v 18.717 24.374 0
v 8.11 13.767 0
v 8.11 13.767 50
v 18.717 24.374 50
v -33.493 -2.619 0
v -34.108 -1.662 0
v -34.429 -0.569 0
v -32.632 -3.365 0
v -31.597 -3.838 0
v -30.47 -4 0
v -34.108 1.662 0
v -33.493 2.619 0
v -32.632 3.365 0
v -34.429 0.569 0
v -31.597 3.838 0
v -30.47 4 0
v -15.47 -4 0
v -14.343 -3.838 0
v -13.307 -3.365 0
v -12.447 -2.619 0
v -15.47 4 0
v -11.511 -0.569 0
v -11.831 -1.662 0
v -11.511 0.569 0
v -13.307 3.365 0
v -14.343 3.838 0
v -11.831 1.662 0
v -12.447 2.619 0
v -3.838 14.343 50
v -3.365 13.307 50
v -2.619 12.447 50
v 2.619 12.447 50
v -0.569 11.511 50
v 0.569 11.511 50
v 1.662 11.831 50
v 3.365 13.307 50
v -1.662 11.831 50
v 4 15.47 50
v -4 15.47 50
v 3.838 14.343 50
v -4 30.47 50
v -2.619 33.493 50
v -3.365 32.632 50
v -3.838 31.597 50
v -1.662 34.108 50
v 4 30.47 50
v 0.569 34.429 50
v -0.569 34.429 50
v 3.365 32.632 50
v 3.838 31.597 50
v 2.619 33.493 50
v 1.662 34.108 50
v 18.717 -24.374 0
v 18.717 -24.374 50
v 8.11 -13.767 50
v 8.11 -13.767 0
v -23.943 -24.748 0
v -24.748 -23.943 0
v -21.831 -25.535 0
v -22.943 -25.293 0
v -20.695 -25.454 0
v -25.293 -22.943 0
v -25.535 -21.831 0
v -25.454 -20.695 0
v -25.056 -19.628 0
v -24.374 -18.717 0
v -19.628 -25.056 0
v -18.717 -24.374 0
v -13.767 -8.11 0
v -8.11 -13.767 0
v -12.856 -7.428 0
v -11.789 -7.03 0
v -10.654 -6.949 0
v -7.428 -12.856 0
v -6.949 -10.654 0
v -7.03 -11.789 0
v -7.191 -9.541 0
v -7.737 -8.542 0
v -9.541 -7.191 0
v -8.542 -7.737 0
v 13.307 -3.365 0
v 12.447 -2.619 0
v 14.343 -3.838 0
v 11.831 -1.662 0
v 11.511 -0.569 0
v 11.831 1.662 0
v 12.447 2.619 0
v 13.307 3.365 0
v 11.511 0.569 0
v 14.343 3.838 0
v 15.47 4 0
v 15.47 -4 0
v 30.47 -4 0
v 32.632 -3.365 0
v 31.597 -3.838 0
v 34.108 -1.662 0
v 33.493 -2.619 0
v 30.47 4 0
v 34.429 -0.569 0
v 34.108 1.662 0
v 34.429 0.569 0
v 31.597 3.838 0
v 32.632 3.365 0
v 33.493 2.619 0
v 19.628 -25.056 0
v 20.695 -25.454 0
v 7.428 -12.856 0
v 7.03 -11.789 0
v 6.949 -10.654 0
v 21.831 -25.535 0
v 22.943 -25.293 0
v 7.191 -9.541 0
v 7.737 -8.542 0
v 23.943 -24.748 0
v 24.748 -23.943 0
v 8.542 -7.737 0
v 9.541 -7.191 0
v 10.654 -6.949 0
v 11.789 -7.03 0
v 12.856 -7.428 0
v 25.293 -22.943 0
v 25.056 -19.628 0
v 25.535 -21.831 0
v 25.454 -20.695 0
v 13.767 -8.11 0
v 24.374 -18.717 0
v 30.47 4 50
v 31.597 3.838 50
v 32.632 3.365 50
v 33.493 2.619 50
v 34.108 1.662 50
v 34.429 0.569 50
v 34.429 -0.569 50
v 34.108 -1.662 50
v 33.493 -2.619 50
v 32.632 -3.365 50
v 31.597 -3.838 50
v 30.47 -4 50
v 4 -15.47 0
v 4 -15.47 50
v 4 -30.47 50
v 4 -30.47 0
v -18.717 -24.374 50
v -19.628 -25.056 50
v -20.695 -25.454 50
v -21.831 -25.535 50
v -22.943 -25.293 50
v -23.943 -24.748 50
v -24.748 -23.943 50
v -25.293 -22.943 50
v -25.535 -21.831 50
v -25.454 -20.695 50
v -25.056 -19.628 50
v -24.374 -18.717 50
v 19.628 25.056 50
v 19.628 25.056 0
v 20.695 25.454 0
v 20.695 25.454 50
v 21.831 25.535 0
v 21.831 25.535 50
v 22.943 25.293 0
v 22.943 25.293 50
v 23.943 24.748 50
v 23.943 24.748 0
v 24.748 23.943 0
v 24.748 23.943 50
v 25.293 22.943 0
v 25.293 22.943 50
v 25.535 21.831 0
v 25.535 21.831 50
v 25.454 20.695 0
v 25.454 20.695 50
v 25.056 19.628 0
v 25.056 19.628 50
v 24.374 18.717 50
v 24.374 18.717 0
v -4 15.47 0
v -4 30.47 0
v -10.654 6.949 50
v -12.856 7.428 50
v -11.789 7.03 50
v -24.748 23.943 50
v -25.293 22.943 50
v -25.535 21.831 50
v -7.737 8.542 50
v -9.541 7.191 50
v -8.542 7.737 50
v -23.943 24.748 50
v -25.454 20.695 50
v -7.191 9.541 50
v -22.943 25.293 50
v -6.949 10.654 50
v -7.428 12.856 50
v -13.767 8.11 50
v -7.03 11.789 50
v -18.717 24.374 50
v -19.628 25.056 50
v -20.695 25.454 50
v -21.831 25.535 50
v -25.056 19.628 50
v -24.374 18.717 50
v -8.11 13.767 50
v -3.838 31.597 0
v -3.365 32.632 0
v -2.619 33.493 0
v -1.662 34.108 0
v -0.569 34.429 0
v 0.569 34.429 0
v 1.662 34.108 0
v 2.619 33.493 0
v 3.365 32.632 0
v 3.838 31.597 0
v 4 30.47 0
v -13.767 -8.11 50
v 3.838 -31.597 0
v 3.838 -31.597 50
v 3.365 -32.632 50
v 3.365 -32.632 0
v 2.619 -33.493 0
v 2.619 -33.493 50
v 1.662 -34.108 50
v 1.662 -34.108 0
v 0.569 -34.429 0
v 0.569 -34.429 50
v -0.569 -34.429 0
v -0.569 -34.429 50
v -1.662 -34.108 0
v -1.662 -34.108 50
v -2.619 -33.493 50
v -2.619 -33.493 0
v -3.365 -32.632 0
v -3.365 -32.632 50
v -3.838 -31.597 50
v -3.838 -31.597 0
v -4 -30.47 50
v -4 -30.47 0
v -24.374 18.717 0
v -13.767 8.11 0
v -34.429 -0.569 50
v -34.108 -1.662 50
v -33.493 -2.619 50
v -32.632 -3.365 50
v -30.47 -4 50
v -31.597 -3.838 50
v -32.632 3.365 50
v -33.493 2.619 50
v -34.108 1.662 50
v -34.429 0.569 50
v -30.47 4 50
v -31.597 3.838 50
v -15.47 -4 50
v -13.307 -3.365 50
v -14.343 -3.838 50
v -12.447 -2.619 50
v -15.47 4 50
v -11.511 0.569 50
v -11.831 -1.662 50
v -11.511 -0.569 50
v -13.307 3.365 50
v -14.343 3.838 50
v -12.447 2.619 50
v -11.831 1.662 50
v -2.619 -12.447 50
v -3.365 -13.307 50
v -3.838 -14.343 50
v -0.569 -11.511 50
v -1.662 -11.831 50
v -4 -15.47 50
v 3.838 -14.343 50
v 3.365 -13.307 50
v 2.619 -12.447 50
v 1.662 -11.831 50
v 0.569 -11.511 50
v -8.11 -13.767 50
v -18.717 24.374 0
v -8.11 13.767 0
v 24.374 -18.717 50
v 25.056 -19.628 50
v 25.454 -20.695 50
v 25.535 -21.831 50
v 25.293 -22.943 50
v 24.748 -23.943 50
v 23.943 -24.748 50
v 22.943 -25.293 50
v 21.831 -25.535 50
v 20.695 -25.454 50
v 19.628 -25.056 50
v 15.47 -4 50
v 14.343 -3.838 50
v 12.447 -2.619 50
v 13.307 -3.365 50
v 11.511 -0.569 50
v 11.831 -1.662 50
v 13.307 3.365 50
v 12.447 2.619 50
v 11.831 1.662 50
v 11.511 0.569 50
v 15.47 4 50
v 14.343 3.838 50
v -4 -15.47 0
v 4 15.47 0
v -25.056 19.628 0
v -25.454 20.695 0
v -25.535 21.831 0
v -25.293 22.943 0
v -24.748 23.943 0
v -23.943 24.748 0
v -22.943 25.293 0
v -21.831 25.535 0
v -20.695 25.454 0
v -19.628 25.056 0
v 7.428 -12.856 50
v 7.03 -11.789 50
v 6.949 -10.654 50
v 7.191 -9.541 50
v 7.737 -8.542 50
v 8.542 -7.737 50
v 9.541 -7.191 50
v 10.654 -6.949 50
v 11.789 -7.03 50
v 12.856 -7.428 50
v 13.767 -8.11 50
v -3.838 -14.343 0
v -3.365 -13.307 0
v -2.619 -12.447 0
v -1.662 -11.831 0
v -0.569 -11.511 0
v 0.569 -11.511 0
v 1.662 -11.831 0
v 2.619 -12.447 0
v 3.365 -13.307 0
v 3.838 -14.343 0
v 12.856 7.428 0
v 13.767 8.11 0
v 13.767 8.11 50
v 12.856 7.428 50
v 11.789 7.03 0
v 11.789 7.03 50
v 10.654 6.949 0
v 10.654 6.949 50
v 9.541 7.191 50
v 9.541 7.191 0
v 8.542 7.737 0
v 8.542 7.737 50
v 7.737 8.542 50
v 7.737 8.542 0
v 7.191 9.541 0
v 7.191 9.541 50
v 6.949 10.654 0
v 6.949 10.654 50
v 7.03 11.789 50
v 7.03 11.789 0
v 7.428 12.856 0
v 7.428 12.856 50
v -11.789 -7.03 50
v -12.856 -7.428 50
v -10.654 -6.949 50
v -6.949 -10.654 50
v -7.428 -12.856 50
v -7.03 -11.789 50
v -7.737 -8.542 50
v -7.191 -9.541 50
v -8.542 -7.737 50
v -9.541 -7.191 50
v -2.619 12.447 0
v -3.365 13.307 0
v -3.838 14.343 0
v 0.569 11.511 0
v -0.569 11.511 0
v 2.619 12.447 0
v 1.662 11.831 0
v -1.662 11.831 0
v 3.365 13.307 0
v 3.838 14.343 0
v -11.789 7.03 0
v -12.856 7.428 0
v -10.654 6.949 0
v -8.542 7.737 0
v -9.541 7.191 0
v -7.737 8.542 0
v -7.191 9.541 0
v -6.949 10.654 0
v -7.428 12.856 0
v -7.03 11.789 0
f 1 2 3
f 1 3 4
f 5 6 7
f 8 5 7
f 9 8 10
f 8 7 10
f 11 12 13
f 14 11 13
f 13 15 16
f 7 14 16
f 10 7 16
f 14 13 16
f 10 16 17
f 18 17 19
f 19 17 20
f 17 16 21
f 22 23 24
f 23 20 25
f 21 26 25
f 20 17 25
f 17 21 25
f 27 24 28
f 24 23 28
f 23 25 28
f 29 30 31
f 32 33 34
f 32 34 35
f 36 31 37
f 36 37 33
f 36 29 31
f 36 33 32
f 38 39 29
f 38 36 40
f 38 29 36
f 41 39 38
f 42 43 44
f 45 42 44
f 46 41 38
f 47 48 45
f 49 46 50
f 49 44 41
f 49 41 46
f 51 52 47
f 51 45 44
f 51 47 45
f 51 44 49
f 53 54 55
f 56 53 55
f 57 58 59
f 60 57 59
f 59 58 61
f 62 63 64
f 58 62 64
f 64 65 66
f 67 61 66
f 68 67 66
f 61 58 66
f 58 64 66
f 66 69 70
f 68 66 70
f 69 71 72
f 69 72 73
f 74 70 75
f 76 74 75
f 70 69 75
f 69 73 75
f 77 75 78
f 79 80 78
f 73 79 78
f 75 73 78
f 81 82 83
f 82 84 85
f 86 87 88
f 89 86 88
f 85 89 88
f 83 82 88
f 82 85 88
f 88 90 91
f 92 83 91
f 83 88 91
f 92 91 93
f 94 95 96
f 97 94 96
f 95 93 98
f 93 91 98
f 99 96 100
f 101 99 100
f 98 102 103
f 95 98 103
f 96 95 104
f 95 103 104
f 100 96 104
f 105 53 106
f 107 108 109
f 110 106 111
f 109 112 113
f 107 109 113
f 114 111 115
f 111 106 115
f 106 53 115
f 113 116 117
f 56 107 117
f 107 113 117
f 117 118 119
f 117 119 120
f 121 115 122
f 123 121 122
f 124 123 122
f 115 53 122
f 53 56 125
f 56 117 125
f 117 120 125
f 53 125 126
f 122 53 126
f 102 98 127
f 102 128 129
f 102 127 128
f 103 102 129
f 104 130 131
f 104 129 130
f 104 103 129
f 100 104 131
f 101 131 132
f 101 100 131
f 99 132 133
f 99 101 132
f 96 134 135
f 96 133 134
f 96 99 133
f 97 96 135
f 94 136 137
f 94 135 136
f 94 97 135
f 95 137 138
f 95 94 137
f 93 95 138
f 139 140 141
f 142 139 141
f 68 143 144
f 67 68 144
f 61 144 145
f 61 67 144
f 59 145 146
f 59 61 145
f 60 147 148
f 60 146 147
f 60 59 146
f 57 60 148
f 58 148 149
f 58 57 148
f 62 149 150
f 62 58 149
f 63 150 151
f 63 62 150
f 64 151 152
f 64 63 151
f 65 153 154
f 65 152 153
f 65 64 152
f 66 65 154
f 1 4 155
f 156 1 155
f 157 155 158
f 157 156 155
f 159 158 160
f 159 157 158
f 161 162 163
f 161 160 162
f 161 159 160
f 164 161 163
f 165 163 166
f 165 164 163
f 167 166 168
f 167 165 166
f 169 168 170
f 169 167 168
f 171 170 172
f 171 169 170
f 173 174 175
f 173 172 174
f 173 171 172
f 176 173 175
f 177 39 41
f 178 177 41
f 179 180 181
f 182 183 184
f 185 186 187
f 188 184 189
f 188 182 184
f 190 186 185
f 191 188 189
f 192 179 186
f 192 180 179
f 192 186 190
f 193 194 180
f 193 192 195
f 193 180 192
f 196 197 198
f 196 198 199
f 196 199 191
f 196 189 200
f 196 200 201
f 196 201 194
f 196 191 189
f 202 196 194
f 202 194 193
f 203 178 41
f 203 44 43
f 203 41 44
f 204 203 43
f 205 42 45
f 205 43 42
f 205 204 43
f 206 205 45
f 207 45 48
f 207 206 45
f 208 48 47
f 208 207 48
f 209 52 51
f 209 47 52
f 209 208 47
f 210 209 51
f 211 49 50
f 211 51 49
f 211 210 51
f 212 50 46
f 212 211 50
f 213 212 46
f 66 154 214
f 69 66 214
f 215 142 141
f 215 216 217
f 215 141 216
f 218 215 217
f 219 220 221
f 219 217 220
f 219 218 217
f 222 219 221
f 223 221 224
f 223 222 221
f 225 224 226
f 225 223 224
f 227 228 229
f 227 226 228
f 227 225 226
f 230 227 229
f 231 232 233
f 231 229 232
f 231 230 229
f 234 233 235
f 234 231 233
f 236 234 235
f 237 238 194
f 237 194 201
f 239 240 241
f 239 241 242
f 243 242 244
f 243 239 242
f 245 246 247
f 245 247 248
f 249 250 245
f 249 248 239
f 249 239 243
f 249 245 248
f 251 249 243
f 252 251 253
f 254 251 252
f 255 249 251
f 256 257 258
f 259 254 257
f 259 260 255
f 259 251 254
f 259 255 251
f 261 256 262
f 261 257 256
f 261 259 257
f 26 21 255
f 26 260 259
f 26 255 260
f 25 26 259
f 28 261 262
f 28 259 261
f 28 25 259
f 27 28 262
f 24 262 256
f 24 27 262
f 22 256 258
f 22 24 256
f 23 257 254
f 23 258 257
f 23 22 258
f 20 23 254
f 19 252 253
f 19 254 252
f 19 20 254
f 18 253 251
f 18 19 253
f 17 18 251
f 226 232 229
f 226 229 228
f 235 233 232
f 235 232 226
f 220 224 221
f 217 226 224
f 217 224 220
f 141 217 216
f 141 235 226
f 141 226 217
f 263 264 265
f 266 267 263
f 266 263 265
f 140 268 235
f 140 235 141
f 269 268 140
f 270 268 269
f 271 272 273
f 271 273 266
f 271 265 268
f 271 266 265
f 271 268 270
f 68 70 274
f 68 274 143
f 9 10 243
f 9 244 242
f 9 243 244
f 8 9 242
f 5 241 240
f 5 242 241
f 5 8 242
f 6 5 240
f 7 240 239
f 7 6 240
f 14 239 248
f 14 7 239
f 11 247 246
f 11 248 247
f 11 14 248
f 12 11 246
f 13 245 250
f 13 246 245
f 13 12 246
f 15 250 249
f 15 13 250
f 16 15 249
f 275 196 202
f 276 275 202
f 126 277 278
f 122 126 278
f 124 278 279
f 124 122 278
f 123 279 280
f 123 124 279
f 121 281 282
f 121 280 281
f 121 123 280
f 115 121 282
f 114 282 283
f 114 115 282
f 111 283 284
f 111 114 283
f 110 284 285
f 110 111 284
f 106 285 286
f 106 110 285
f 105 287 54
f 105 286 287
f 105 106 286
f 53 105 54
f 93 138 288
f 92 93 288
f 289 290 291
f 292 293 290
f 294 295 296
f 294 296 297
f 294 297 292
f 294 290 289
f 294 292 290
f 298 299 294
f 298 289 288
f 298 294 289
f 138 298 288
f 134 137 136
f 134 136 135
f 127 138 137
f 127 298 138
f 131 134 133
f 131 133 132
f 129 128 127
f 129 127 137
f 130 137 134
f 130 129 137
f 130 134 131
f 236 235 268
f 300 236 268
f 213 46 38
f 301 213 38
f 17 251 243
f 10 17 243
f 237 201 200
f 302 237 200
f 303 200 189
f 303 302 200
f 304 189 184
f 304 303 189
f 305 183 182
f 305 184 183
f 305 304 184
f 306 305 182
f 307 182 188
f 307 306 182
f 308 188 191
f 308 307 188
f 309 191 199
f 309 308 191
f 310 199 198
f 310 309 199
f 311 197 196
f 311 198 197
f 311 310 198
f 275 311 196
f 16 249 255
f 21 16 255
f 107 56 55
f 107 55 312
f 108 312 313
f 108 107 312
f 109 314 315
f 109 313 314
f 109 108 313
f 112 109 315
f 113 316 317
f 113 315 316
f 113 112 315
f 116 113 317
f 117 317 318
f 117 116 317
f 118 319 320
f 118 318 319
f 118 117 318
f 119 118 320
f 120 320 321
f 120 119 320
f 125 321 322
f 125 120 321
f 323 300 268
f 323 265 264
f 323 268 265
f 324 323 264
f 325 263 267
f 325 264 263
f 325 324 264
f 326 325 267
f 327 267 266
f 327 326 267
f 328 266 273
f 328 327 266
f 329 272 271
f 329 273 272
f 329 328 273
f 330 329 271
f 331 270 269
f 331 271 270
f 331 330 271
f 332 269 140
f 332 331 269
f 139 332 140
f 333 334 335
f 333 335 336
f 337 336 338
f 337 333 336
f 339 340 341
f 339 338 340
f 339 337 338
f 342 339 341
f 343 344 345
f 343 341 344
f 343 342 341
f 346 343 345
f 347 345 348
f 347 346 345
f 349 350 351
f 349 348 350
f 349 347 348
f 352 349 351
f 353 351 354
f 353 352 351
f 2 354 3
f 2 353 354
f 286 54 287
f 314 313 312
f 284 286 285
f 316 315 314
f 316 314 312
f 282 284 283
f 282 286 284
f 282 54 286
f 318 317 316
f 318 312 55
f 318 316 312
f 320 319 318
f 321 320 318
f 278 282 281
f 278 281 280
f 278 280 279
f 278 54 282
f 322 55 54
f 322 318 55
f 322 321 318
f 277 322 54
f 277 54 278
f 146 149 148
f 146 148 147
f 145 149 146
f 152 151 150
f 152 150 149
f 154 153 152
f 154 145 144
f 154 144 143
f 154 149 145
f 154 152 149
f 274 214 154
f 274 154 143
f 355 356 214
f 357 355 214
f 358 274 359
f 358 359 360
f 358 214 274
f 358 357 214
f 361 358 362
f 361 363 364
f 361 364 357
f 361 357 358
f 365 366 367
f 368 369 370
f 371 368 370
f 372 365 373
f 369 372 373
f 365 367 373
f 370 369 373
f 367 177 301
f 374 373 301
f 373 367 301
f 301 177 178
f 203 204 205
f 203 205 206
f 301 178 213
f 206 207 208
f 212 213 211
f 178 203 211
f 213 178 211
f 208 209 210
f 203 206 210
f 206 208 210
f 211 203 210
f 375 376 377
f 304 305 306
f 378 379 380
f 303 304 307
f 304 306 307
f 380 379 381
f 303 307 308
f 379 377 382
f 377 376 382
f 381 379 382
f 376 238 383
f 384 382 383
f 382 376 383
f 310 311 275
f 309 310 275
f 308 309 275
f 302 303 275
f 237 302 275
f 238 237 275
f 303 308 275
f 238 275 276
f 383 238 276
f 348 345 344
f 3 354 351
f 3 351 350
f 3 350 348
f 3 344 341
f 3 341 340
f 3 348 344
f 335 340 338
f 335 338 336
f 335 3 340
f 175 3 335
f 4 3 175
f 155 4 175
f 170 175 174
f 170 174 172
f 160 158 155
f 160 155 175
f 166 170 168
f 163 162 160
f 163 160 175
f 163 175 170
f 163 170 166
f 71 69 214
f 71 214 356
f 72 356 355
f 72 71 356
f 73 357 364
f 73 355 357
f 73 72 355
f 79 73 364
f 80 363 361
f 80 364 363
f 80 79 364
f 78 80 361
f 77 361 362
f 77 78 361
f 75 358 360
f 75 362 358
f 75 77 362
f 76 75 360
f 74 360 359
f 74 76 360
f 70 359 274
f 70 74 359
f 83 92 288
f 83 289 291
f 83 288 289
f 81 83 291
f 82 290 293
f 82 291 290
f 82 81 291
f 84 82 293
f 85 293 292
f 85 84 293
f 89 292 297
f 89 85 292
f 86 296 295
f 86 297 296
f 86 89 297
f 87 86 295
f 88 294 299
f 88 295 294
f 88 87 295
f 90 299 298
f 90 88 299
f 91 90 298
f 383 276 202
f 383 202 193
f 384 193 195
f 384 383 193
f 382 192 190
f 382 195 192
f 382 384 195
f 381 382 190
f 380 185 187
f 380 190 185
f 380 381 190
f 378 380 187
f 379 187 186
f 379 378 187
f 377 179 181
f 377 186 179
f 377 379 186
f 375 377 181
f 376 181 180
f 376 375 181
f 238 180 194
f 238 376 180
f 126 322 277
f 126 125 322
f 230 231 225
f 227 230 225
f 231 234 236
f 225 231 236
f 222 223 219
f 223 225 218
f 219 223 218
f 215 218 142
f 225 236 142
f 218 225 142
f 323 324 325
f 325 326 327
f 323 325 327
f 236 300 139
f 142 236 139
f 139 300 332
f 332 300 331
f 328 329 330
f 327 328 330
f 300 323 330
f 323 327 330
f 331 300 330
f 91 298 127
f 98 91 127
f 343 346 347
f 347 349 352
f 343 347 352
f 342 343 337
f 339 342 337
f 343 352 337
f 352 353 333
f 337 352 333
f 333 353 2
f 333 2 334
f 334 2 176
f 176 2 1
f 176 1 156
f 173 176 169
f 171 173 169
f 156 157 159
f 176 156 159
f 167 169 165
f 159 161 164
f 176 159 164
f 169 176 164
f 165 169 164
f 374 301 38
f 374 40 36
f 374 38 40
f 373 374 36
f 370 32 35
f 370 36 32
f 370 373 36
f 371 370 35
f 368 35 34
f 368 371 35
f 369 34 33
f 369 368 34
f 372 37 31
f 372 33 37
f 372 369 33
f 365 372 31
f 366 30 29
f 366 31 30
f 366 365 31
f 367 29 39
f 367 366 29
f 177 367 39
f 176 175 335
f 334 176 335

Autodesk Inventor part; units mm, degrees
ref_plane "YZ Plane" through (0, 0, 0) normal (1, 0, 0) x (0, 1, 0)
ref_plane "XZ Plane" through (0, 0, 0) normal (0, 1, 0) x (-1, 0, 0)
ref_plane "XY Plane" through (0, 0, 0) normal (0, 0, 1) x (1, 0, 0)
sketch "Sketch1" plane through (0, 0, 0) normal (0, 0, 1) x (1, 0, 0)
  line L0 (0, 30.4699) -> (0, 15.4699) construction
  line L1 (4, 30.4699) -> (4, 15.4699)
  line L2 (-4, 15.4699) -> (-4, 30.4699)
  arc A0 (4, 30.4699) -> (-4, 30.4699) centre (0, 30.4699) ccw
  arc A1 (-4, 15.4699) -> (4, 15.4699) centre (0, 15.4699) ccw
  circle A2 centre (0, 0) radius 22.9699 construction
  arc A3 (-18.717, 24.3739) -> (-24.3739, 18.717) centre (-21.5455, 21.5455) ccw
  line L3 (-18.717, 24.3739) -> (-8.1104, 13.7673)
  arc A4 (-13.7673, 8.1104) -> (-8.1104, 13.7673) centre (-10.9389, 10.9389) ccw
  line L4 (-13.7673, 8.1104) -> (-24.3739, 18.717)
  circle A5 centre (0, 0) radius 22.9699 construction
  arc A6 (-30.4699, 4) -> (-30.4699, -4) centre (-30.4699, 0) ccw
  line L5 (-30.4699, 4) -> (-15.4699, 4)
  arc A7 (-15.4699, -4) -> (-15.4699, 4) centre (-15.4699, 0) ccw
  line L6 (-15.4699, -4) -> (-30.4699, -4)
  circle A8 centre (0, 0) radius 22.9699 construction
  arc A9 (-24.3739, -18.717) -> (-18.717, -24.3739) centre (-21.5455, -21.5455) ccw
  line L7 (-24.3739, -18.717) -> (-13.7673, -8.1104)
  arc A10 (-8.1104, -13.7673) -> (-13.7673, -8.1104) centre (-10.9389, -10.9389) ccw
  line L8 (-8.1104, -13.7673) -> (-18.717, -24.3739)
  circle A11 centre (0, 0) radius 22.9699 construction
  arc A12 (-4, -30.4699) -> (4, -30.4699) centre (0, -30.4699) ccw
  line L9 (-4, -30.4699) -> (-4, -15.4699)
  arc A13 (4, -15.4699) -> (-4, -15.4699) centre (0, -15.4699) ccw
  line L10 (4, -15.4699) -> (4, -30.4699)
  circle A14 centre (0, 0) radius 22.9699 construction
  arc A15 (18.717, -24.3739) -> (24.3739, -18.717) centre (21.5455, -21.5455) ccw
  line L11 (18.717, -24.3739) -> (8.1104, -13.7673)
  arc A16 (13.7673, -8.1104) -> (8.1104, -13.7673) centre (10.9389, -10.9389) ccw
  line L12 (13.7673, -8.1104) -> (24.3739, -18.717)
  circle A17 centre (0, 0) radius 22.9699 construction
  arc A18 (30.4699, -4) -> (30.4699, 4) centre (30.4699, 0) ccw
  line L13 (30.4699, -4) -> (15.4699, -4)
  arc A19 (15.4699, 4) -> (15.4699, -4) centre (15.4699, 0) ccw
  line L14 (15.4699, 4) -> (30.4699, 4)
  circle A20 centre (0, 0) radius 22.9699 construction
  arc A21 (24.3739, 18.717) -> (18.717, 24.3739) centre (21.5455, 21.5455) ccw
  line L15 (24.3739, 18.717) -> (13.7673, 8.1104)
  arc A22 (8.1104, 13.7673) -> (13.7673, 8.1104) centre (10.9389, 10.9389) ccw
  line L16 (8.1104, 13.7673) -> (18.717, 24.3739)
  circle A23 centre (0, 0) radius 22.9699 construction
  point P0 (0, 22.9699)
  point P1 (-16.2422, 16.2422)
  point P2 (-22.9699, 0)
  point P3 (-16.2422, -16.2422)
  point P4 (0, -22.9699)
  point P5 (16.2422, -16.2422)
  point P6 (22.9699, 0)
  point P7 (16.2422, 16.2422)
  dimension "d0" = 4
  dimension "d1" = 15
  dimension "d4" = 360
extrude "Extrusion1" add sketch "Sketch1" along normal blind 50
properties part number "location hole"
